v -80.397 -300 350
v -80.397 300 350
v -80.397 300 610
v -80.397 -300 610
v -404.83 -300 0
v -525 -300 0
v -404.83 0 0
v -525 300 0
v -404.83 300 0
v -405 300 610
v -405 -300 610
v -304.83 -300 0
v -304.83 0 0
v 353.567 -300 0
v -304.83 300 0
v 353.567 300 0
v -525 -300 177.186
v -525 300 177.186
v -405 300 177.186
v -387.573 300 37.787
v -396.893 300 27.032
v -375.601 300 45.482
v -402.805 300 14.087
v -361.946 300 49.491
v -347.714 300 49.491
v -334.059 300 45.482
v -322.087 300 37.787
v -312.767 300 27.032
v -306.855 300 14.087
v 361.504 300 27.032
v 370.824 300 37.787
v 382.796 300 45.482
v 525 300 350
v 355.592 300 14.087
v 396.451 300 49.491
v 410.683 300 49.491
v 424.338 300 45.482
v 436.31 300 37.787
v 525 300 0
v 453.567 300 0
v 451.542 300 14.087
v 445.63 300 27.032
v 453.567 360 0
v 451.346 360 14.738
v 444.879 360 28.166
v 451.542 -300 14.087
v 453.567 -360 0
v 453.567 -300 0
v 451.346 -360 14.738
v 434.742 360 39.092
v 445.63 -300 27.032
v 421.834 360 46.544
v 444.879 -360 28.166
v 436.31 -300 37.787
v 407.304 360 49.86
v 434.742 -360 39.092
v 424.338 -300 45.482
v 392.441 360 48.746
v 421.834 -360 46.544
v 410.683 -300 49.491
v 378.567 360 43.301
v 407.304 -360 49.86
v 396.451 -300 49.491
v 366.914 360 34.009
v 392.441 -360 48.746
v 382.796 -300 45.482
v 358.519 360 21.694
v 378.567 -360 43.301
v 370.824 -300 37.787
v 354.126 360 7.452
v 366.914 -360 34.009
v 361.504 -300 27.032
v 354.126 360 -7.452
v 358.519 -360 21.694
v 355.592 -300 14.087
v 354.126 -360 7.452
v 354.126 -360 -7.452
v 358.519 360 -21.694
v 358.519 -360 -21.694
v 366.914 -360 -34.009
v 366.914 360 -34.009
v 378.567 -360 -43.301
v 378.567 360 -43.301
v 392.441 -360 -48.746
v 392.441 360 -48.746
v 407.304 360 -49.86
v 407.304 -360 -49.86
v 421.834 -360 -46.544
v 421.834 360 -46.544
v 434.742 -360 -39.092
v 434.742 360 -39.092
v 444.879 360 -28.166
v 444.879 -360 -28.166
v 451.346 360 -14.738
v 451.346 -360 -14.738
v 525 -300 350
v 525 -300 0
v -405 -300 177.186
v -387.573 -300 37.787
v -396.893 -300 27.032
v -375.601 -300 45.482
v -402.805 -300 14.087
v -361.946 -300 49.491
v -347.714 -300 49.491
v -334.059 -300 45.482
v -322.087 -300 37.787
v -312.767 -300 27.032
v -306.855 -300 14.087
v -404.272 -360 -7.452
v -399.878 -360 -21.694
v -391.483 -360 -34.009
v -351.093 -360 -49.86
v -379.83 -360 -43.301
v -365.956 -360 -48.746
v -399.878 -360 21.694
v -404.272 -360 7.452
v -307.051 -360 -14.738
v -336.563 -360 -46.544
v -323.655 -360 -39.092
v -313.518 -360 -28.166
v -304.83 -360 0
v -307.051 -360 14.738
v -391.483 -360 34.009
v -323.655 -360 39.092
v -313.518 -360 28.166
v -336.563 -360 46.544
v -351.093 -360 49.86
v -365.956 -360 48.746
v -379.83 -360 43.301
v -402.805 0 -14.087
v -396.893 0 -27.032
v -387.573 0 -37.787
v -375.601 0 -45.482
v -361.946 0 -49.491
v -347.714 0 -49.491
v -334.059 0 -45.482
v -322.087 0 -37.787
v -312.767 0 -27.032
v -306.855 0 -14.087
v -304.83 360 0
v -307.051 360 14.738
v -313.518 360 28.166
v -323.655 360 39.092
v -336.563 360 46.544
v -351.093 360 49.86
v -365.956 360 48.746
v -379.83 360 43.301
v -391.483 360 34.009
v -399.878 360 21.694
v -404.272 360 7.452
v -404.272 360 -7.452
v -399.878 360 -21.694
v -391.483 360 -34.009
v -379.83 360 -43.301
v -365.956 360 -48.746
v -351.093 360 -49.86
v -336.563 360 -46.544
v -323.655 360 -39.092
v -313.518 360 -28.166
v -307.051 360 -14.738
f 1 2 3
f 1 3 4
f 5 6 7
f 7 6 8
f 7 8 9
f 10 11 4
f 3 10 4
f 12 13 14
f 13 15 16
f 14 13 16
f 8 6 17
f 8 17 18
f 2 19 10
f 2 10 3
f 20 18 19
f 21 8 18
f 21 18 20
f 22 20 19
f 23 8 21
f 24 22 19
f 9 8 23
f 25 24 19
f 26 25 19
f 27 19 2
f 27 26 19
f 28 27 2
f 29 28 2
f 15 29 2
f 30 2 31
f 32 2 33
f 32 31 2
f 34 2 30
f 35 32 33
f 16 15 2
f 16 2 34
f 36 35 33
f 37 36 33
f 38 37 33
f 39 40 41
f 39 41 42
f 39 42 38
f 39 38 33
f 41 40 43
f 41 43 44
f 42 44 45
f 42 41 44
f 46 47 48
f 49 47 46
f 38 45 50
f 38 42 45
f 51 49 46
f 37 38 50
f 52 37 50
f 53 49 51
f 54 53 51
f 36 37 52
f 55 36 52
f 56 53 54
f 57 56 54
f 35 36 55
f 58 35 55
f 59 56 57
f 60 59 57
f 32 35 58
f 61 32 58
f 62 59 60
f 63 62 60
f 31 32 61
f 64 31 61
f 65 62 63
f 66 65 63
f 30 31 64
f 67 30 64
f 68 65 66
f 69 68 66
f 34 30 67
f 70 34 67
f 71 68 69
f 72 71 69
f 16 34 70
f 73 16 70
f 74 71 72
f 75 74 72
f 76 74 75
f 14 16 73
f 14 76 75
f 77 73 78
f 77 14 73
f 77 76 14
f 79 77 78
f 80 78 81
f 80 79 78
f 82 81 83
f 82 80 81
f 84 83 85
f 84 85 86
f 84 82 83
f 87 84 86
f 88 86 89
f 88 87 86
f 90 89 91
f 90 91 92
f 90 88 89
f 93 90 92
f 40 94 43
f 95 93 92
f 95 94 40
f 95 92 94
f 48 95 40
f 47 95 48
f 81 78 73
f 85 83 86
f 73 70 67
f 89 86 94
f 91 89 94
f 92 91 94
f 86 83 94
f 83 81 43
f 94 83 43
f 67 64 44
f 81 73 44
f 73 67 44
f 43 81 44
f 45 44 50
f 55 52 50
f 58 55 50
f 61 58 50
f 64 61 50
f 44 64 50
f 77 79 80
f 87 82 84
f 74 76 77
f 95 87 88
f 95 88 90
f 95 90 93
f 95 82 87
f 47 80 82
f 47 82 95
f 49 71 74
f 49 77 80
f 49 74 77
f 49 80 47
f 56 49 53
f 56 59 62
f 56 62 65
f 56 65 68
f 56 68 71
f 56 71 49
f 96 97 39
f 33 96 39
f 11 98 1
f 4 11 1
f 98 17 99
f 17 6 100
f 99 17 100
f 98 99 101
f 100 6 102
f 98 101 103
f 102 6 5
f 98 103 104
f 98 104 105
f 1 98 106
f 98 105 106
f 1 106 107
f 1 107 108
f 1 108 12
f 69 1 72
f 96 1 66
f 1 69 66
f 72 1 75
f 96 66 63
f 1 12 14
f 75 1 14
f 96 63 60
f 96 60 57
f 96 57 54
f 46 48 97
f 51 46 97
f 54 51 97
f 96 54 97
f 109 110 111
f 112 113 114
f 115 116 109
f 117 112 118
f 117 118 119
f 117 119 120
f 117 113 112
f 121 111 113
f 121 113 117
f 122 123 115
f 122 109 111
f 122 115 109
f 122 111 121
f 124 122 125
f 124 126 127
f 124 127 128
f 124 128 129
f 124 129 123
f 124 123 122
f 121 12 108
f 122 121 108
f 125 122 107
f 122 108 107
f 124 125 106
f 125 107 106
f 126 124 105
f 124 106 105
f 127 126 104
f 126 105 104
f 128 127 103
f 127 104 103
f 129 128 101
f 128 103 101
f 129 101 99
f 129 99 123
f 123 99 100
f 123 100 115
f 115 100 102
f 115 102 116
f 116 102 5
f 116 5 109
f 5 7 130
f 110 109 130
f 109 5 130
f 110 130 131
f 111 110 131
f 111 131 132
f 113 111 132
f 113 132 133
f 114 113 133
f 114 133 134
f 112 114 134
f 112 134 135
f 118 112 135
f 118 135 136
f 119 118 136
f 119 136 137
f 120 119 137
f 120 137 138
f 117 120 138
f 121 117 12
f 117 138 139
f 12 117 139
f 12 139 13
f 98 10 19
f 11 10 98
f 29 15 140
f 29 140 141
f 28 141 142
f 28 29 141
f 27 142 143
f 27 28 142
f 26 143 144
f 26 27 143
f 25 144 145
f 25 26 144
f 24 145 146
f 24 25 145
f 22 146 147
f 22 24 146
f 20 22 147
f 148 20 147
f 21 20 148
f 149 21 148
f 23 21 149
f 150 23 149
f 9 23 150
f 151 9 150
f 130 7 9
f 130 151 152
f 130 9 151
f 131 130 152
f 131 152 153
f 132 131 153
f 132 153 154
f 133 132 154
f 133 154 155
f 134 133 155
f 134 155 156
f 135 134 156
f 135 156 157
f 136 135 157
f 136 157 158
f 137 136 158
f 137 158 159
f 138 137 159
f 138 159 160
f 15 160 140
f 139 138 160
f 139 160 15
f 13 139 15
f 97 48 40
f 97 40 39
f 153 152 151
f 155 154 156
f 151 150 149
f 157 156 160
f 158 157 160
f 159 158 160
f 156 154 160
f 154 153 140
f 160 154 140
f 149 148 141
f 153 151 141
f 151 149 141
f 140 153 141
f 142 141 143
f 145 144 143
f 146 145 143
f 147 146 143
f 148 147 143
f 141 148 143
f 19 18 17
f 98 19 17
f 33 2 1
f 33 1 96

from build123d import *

# Parameters (mm, degrees)
F0_W     = 1050
F0_H     = 600
F1_DEPTH = 350
F2_W     = 444.603228569
F2_H     = 600
F3_DEPTH = 610
F4_R     = 50
F5_DEPTH = 360
F6_W     = 600
F6_H     = 432.8142261505
F7_DEPTH = 120


with BuildPart() as f1:
    # F0 (on Top) → F1 (new body)
    with BuildSketch(Plane.XY):
        Rectangle(F0_W, F0_H)
    extrude(amount=F1_DEPTH)

    # F2 (on face) → F3 (join)
    with BuildSketch(Plane(origin=(0, 0, 0), x_dir=(1, 0, 0), z_dir=(0, 0, -1))):
        with Locations((-302.6983857155, 0)):
            Rectangle(F2_W, F2_H)
    extrude(amount=-F3_DEPTH)

    # F4 (on Front) → F5 (join, symmetric)
    with BuildSketch(Plane.XZ):
        with Locations((-354.8299782291, 0)):
            Circle(F4_R)
        with Locations((403.5670862999, 0)):
            Circle(F4_R)
    extrude(amount=F5_DEPTH, both=True)

    # F6 (on face) → F7 (cut)
    with BuildSketch(Plane(origin=(-525, 0, 0), x_dir=(0, -1, 0), z_dir=(-1, 0, 0))):
        with Locations((0, 393.5928869247)):
            Rectangle(F6_W, F6_H)
    extrude(amount=-F7_DEPTH, mode=Mode.SUBTRACT)


solid = f1.part
